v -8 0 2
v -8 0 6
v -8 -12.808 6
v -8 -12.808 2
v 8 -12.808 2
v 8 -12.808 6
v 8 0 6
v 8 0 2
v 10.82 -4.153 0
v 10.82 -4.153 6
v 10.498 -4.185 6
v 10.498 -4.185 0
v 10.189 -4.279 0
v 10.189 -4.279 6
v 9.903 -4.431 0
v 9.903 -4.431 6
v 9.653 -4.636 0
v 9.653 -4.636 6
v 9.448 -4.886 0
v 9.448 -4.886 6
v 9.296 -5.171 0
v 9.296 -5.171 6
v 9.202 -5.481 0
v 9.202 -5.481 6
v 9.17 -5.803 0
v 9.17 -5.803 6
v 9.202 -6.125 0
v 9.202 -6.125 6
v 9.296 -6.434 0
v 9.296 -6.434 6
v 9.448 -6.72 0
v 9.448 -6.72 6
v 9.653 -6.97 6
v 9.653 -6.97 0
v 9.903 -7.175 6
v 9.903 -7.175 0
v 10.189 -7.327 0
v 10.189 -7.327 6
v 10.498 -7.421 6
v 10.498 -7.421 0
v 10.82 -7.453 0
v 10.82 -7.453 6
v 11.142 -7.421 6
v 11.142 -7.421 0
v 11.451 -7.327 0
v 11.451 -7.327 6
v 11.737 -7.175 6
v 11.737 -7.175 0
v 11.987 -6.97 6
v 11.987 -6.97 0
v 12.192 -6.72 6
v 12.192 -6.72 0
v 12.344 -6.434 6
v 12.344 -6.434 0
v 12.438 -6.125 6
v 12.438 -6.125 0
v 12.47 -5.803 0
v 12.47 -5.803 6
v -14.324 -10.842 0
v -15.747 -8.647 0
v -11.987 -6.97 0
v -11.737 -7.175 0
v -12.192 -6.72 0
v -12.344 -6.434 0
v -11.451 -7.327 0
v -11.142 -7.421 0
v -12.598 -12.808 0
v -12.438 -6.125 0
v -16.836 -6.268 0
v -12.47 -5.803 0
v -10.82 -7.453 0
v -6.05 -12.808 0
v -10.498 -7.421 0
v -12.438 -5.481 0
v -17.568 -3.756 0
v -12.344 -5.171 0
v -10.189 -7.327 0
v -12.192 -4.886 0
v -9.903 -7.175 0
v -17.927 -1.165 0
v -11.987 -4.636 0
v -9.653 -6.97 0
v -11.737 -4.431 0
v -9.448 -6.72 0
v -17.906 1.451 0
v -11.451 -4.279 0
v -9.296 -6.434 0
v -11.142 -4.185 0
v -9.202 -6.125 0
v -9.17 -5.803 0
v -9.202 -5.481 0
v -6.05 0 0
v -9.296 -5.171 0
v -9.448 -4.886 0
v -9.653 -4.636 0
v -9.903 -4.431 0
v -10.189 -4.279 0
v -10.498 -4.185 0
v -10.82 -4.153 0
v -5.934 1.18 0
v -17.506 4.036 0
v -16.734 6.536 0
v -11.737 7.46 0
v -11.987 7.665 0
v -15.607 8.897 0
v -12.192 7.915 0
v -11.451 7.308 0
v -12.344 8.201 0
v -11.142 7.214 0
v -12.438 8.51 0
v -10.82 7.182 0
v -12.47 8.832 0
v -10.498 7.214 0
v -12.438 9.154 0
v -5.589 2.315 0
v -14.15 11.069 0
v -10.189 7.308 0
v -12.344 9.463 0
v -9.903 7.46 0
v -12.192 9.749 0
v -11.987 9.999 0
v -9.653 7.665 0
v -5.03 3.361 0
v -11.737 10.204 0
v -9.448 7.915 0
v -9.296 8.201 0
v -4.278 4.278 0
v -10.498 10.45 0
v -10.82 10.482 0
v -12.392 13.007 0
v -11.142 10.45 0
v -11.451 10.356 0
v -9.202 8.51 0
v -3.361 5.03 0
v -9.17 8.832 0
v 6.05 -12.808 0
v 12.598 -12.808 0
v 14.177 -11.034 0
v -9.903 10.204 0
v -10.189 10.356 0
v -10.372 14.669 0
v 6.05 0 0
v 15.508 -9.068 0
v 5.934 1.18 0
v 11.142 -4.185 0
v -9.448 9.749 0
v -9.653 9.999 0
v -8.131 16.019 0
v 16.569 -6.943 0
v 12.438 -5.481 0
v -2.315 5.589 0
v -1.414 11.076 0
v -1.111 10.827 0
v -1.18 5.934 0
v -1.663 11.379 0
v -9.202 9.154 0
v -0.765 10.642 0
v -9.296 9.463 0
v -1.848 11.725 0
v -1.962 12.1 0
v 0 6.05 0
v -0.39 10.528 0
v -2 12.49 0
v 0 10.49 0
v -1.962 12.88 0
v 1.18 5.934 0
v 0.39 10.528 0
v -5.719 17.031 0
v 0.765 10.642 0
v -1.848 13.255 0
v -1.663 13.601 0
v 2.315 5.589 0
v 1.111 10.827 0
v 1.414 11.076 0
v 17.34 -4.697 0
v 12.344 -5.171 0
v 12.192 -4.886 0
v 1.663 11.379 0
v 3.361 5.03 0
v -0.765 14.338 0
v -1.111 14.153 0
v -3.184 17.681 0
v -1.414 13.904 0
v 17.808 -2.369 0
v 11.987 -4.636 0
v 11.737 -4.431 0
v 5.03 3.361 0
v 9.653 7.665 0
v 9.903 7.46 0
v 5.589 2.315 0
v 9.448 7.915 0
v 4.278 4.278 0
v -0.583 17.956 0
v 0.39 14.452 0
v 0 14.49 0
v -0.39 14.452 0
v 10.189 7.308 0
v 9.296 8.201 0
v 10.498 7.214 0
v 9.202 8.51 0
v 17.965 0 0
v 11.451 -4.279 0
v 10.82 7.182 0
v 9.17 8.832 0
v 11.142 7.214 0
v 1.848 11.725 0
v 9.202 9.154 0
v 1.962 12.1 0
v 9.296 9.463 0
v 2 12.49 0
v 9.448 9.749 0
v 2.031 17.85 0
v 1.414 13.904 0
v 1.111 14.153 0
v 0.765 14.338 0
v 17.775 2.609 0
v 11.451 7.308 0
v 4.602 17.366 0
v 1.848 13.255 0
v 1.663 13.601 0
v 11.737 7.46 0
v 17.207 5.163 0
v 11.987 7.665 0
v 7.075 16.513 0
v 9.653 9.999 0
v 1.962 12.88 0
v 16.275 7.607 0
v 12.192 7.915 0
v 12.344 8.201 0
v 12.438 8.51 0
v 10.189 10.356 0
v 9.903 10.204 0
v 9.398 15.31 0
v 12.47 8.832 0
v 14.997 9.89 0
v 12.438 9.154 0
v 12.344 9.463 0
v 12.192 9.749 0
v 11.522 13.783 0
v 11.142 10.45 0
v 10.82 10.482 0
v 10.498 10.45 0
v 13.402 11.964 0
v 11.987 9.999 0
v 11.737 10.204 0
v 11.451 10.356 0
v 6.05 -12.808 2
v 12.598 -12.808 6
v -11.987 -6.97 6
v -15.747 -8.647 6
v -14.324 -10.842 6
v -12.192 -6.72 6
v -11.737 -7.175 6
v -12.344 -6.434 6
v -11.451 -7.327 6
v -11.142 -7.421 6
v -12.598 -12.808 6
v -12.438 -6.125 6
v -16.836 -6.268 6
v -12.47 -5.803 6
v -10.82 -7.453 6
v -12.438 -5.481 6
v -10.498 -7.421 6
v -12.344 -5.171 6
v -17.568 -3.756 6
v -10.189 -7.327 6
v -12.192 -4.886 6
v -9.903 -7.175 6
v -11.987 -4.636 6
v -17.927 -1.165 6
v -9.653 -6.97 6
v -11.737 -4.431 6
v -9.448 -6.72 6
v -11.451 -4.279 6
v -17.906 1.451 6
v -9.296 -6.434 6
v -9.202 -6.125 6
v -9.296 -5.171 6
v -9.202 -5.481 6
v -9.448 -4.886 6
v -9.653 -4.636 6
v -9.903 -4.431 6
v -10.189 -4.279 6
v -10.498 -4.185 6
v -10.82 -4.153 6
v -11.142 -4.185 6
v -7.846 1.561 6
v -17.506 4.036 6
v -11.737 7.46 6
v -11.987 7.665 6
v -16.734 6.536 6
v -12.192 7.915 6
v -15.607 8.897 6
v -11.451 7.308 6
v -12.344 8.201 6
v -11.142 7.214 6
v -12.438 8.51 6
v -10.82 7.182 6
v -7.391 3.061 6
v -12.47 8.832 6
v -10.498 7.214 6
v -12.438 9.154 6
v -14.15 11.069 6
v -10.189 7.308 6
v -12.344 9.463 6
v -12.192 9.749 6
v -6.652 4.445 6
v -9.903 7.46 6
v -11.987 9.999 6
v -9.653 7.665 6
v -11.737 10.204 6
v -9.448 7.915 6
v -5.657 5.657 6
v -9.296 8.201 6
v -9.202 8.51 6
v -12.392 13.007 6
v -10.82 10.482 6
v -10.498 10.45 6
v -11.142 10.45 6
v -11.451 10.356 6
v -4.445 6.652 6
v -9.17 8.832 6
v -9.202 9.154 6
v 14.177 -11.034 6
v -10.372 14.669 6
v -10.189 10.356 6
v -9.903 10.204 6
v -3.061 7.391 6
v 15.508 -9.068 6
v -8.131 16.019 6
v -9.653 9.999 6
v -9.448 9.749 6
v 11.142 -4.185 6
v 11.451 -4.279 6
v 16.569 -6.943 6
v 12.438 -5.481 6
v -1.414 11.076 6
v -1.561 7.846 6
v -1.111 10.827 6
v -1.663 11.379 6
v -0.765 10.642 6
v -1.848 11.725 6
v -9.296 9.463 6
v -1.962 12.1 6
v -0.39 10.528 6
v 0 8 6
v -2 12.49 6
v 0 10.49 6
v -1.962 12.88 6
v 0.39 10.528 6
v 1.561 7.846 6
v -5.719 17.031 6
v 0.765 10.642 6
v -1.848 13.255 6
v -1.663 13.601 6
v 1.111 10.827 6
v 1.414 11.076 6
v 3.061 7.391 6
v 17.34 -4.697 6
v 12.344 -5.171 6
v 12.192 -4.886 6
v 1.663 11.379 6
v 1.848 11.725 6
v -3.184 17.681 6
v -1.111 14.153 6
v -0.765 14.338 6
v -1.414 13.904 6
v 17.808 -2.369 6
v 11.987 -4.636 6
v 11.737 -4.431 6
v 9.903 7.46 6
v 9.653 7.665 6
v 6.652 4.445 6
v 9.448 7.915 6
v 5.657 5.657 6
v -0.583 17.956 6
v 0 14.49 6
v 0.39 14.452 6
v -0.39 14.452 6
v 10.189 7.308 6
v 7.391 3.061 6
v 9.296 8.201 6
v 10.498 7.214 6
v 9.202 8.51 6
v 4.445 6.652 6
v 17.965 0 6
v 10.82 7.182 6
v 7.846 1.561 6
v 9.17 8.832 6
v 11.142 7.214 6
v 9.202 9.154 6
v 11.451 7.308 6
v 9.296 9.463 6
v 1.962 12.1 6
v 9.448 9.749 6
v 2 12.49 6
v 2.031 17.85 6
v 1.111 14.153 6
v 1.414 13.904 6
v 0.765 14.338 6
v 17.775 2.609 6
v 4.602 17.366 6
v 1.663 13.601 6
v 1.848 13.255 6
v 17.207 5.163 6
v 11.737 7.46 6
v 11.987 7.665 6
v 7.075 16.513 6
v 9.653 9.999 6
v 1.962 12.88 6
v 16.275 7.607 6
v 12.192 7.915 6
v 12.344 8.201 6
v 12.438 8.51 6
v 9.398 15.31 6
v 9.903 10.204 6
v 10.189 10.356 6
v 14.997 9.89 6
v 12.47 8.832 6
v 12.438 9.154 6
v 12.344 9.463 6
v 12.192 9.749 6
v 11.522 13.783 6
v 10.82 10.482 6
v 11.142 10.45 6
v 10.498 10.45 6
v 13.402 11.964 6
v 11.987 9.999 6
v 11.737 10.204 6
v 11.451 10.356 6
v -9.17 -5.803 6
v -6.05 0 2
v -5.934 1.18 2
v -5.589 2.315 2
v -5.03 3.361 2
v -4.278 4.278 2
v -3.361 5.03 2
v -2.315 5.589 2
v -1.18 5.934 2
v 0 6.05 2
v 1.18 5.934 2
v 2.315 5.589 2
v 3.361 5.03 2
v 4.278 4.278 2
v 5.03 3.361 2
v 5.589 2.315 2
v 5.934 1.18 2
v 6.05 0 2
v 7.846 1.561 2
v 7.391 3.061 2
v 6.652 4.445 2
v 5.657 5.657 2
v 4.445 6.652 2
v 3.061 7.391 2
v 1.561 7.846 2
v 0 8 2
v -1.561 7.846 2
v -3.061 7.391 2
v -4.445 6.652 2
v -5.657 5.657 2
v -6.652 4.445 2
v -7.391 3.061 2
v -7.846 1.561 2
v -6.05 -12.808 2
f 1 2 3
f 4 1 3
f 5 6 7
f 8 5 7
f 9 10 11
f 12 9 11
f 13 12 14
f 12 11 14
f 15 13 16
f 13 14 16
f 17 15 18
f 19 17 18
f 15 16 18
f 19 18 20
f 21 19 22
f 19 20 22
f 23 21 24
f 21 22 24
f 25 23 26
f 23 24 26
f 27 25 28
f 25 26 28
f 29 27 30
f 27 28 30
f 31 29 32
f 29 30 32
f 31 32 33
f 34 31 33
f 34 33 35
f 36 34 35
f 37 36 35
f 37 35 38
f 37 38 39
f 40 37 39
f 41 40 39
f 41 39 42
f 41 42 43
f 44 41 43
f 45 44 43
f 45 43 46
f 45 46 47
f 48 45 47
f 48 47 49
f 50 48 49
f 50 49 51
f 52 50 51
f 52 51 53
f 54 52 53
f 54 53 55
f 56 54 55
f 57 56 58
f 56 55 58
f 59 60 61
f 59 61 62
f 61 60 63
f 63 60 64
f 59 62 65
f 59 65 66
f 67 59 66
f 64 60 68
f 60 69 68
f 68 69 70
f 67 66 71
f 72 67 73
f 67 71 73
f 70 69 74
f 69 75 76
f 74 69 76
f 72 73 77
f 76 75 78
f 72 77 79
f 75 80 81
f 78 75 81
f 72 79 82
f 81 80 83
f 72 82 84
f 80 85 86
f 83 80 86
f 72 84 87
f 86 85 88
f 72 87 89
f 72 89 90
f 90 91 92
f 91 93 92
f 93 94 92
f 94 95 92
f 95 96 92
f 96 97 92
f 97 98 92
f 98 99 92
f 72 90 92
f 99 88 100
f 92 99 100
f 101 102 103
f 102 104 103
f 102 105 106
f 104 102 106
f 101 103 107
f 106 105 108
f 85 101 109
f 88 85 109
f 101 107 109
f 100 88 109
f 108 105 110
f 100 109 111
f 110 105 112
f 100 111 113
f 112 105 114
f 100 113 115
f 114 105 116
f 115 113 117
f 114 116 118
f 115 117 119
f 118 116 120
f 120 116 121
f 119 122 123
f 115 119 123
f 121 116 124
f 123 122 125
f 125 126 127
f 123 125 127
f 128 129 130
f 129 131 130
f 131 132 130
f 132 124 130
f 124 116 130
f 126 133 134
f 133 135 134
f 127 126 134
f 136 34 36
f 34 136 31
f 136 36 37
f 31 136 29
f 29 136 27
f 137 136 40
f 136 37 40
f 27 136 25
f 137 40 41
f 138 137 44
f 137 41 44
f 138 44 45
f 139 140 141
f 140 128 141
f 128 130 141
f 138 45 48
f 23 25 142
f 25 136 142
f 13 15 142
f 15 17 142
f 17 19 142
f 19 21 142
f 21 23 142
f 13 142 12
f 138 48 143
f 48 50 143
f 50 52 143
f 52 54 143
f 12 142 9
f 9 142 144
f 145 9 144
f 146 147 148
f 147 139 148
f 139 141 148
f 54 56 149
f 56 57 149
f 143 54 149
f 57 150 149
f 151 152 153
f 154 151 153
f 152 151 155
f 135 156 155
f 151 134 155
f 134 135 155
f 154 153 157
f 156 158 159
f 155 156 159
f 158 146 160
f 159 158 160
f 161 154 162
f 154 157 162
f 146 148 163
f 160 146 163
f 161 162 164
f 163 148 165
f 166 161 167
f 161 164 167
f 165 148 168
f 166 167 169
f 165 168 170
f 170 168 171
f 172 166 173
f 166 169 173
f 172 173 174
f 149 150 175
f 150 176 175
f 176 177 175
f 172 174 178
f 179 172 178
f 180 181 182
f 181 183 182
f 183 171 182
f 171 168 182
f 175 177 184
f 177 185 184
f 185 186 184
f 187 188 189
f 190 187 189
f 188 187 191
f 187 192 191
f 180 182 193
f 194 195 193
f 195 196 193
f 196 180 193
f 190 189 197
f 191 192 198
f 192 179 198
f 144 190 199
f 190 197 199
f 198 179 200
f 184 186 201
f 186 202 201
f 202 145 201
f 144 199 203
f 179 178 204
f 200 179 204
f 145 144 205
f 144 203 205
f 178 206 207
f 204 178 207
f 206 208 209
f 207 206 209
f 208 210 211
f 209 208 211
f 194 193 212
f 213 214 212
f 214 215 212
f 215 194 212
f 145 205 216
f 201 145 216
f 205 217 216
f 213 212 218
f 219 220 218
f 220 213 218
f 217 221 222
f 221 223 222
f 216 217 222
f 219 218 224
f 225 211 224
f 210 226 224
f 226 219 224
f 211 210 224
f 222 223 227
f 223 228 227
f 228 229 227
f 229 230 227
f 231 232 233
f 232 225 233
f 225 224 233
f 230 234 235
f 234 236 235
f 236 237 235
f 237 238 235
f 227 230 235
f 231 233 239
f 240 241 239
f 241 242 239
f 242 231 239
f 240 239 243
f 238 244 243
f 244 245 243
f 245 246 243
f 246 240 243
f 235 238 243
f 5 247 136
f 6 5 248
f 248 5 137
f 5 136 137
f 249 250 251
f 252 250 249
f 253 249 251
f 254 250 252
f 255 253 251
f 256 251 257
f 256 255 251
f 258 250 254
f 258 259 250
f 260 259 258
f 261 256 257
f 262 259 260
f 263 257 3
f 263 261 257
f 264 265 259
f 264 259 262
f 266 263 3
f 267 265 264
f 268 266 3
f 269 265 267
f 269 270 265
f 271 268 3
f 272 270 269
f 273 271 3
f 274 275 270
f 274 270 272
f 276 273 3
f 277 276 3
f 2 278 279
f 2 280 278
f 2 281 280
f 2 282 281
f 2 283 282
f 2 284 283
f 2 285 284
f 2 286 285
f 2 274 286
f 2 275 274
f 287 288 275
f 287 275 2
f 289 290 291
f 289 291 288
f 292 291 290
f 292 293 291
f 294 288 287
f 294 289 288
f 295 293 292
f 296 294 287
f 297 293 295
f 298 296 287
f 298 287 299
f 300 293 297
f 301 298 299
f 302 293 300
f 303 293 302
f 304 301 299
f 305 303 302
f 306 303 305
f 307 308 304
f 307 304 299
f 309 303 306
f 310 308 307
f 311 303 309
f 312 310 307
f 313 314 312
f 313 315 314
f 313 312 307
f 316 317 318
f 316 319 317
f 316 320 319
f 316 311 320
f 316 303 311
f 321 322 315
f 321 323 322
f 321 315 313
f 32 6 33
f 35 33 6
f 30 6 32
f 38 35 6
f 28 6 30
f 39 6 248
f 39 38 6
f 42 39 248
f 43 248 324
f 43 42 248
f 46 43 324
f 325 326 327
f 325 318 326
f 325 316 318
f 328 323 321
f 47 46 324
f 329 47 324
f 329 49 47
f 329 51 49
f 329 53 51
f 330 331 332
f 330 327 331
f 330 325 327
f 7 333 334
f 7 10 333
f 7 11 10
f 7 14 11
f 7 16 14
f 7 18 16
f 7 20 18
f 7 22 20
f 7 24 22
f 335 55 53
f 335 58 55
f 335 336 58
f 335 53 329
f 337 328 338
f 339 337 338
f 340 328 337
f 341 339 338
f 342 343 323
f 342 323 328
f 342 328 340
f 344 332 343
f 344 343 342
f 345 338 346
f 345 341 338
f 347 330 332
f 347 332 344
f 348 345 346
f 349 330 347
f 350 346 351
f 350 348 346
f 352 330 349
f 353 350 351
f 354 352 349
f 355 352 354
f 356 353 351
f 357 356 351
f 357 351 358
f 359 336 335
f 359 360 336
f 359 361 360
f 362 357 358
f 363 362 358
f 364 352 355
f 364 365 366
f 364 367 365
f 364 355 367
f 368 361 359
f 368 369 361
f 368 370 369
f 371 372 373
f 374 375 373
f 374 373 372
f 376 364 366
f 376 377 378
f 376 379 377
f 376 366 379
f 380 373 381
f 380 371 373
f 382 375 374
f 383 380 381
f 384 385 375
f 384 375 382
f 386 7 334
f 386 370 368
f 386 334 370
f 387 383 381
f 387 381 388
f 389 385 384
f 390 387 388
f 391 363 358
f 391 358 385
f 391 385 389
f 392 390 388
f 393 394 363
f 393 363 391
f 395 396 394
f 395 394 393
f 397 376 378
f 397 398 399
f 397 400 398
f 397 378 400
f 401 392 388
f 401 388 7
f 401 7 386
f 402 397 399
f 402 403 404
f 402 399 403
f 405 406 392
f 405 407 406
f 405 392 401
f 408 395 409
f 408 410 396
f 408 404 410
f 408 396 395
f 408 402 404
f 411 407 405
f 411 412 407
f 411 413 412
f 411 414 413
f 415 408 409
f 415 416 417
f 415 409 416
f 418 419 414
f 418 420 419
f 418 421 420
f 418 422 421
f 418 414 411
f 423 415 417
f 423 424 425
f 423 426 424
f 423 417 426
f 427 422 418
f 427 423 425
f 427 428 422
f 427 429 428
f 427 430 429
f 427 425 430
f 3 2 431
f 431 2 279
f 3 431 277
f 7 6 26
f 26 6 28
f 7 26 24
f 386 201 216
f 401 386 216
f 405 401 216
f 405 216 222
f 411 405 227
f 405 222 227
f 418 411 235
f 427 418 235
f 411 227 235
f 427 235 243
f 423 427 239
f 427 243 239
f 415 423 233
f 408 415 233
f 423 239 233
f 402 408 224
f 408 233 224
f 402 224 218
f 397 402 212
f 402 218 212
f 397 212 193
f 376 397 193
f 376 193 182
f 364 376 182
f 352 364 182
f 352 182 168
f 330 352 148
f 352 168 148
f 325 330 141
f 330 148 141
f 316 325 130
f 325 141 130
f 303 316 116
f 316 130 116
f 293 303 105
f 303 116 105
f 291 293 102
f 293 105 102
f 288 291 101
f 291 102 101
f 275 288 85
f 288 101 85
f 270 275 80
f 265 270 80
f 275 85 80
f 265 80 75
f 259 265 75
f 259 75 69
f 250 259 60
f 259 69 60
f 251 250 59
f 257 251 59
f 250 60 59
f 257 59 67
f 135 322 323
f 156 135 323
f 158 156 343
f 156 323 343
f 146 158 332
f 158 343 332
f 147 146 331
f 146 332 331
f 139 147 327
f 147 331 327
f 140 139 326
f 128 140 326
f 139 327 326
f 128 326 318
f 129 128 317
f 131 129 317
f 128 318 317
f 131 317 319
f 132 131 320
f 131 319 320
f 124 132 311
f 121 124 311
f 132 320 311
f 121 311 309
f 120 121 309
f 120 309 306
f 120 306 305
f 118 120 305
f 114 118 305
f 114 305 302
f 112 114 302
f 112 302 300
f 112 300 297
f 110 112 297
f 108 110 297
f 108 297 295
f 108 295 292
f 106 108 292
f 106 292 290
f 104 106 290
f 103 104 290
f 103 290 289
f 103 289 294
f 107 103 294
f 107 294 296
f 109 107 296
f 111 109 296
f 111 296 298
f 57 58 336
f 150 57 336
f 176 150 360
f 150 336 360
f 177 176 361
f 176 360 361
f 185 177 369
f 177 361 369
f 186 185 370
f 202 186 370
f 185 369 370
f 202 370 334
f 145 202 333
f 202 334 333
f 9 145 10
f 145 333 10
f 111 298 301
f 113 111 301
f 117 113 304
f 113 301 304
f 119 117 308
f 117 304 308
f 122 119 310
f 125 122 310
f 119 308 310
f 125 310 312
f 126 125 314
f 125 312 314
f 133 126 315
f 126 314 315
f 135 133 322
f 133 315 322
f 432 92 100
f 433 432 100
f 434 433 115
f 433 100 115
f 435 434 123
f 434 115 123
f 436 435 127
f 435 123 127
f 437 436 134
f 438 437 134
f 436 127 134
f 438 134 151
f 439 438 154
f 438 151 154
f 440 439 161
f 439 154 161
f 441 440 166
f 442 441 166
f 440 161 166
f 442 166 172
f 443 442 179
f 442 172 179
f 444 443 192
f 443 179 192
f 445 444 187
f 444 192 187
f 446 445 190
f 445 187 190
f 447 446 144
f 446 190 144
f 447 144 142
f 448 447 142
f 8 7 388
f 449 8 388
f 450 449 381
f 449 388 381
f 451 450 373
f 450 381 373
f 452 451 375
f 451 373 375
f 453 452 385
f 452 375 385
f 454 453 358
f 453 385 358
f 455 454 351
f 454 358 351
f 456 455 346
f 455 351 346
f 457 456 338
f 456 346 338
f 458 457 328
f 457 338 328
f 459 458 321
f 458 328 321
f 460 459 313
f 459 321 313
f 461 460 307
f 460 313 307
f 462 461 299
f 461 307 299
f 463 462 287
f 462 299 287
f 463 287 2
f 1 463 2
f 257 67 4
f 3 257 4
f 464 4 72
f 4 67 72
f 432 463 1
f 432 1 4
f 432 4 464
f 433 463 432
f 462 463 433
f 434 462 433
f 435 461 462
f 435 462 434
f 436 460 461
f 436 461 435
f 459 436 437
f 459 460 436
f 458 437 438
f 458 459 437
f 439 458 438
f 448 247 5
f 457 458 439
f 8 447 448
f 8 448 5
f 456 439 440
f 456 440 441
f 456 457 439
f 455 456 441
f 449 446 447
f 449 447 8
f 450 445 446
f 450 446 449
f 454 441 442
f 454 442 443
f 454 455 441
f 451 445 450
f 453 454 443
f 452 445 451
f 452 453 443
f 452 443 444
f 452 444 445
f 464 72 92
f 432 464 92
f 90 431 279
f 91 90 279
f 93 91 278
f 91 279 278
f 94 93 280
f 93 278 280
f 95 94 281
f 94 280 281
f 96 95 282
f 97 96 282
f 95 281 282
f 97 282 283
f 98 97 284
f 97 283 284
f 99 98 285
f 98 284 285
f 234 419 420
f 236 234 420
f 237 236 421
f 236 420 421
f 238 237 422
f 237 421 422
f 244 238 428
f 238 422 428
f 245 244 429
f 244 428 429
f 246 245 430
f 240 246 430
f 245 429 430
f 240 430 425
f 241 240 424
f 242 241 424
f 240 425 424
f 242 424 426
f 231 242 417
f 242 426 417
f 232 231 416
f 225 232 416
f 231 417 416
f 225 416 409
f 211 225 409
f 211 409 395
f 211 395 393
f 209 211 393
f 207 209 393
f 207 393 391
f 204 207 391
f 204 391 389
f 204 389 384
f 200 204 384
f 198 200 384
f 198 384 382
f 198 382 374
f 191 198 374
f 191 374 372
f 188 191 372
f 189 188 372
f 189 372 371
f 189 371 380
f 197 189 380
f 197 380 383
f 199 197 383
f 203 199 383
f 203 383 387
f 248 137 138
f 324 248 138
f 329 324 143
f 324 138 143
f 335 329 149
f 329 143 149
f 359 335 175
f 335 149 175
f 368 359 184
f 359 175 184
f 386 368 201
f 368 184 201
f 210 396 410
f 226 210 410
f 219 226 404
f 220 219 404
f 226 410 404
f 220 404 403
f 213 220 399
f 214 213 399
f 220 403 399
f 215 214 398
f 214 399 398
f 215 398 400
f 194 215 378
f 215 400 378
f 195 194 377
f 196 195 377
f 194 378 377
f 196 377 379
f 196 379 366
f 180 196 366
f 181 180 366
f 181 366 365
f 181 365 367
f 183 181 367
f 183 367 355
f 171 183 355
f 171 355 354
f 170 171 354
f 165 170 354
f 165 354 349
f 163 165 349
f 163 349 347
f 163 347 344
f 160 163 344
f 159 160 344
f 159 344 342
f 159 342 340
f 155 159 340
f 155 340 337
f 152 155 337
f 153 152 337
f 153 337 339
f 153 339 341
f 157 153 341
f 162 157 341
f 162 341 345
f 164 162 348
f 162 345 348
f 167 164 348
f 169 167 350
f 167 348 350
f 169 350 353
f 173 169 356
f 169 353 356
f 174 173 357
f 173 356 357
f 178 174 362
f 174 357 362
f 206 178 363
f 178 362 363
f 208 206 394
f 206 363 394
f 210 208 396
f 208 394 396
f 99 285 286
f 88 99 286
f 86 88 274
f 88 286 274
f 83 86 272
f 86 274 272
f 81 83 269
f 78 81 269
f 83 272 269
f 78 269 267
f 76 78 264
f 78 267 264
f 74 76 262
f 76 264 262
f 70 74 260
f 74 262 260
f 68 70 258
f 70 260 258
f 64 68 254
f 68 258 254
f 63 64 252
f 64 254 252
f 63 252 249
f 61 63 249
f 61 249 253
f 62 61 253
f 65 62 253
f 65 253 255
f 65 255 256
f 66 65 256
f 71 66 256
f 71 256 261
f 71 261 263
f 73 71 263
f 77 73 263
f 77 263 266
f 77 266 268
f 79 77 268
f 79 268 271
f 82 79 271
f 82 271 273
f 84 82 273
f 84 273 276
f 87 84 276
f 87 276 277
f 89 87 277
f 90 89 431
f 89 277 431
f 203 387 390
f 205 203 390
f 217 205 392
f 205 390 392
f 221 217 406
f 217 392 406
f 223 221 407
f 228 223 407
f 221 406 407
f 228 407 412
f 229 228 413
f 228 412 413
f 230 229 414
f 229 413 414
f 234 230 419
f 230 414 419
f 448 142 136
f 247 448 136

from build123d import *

# Parameters (mm, degrees)
F1_DEPTH = 6
F2_R     = 2
F3_DEPTH = 25.4
F5_DEPTH = 4


with BuildPart() as f1:
    # F0 (on Top) → F1 (new body)
    with BuildSketch(Plane.XY):
        with BuildLine():
            ThreePointArc((12.5979084153, -12.807573094), (16.5689868381, -6.9433349451), (17.965, 0))
            ThreePointArc((17.965, 0), (-6.9433349451, 16.5689868381), (-12.5979084153, -12.807573094))
            Line((-12.5979084153, -12.807573094), (-6.05, -12.807573094))
            Line((-6.05, -12.807573094), (-6.05, 0))
            ThreePointArc((-6.05, 0), (0, 6.05), (6.05, 0))
            Line((6.05, 0), (6.05, -12.807573094))
            Line((6.05, -12.807573094), (12.5979084153, -12.807573094))
        make_face()
    extrude(amount=F1_DEPTH)

    # F2 (on face) → F3 (cut)
    with BuildSketch(Plane.XY.offset(6)):
        with Locations((0, 12.49)):
            Circle(F2_R)
        with BuildLine():
            ThreePointArc((-10.82, 7.1820178571), (-9.653273811, 7.6652916681), (-9.17, 8.8320178571))
            ThreePointArc((-9.17, 8.8320178571), (-11.986726189, 9.998744046), (-10.82, 7.1820178571))
        make_face()
        with BuildLine():
            ThreePointArc((-9.17, -5.8029047803), (-9.653273811, -4.6361785914), (-10.82, -4.1529047803))
            ThreePointArc((-10.82, -4.1529047803), (-11.986726189, -6.9696309693), (-9.17, -5.8029047803))
        make_face()
        with BuildLine():
            ThreePointArc((10.82, 7.1820178571), (11.986726189, 7.6652916681), (12.47, 8.8320178571))
            ThreePointArc((12.47, 8.8320178571), (9.653273811, 9.998744046), (10.82, 7.1820178571))
        make_face()
        with BuildLine():
            ThreePointArc((12.47, -5.8029047803), (11.986726189, -4.6361785914), (10.82, -4.1529047803))
            ThreePointArc((10.82, -4.1529047803), (9.653273811, -6.9696309693), (12.47, -5.8029047803))
        make_face()
    extrude(amount=-F3_DEPTH, mode=Mode.SUBTRACT)

    # F4 (on face) → F5 (cut)
    with BuildSketch(Plane.XY.offset(6)):
        with BuildLine():
            ThreePointArc((6.05, -5.2342621256), (7.4966659256, -2.7928480088), (8, 0))
            ThreePointArc((8, 0), (0, 8), (-8, 0))
            ThreePointArc((-8, 0), (-7.4966659256, -2.7928480088), (-6.05, -5.2342621256))
            Line((-6.05, -5.2342621256), (-6.05, 0))
            ThreePointArc((-6.05, 0), (0, 6.05), (6.05, 0))
            Line((6.05, 0), (6.05, -5.2342621256))
        make_face()
        with BuildLine():
            Line((8, -12.807573094), (8, 0))
            ThreePointArc((8, 0), (7.4966659256, -2.7928480088), (6.05, -5.2342621256))
            Line((6.05, -5.2342621256), (6.05, -12.807573094))
            Line((6.05, -12.807573094), (8, -12.807573094))
        make_face()
        with BuildLine():
            ThreePointArc((-6.05, -5.2342621256), (-7.4966659256, -2.7928480088), (-8, 0))
            Line((-8, 0), (-8, -12.807573094))
            Line((-8, -12.807573094), (-6.05, -12.807573094))
            Line((-6.05, -12.807573094), (-6.05, -5.2342621256))
        make_face()
        with BuildLine():
            ThreePointArc((-6.05, -5.2342621256), (0, -8), (6.05, -5.2342621256))
            Line((6.05, -5.2342621256), (6.05, 0))
            ThreePointArc((6.05, 0), (0, 6.05), (-6.05, 0))
            Line((-6.05, 0), (-6.05, -5.2342621256))
        make_face()
    extrude(amount=-F5_DEPTH, mode=Mode.SUBTRACT)


solid = f1.part
